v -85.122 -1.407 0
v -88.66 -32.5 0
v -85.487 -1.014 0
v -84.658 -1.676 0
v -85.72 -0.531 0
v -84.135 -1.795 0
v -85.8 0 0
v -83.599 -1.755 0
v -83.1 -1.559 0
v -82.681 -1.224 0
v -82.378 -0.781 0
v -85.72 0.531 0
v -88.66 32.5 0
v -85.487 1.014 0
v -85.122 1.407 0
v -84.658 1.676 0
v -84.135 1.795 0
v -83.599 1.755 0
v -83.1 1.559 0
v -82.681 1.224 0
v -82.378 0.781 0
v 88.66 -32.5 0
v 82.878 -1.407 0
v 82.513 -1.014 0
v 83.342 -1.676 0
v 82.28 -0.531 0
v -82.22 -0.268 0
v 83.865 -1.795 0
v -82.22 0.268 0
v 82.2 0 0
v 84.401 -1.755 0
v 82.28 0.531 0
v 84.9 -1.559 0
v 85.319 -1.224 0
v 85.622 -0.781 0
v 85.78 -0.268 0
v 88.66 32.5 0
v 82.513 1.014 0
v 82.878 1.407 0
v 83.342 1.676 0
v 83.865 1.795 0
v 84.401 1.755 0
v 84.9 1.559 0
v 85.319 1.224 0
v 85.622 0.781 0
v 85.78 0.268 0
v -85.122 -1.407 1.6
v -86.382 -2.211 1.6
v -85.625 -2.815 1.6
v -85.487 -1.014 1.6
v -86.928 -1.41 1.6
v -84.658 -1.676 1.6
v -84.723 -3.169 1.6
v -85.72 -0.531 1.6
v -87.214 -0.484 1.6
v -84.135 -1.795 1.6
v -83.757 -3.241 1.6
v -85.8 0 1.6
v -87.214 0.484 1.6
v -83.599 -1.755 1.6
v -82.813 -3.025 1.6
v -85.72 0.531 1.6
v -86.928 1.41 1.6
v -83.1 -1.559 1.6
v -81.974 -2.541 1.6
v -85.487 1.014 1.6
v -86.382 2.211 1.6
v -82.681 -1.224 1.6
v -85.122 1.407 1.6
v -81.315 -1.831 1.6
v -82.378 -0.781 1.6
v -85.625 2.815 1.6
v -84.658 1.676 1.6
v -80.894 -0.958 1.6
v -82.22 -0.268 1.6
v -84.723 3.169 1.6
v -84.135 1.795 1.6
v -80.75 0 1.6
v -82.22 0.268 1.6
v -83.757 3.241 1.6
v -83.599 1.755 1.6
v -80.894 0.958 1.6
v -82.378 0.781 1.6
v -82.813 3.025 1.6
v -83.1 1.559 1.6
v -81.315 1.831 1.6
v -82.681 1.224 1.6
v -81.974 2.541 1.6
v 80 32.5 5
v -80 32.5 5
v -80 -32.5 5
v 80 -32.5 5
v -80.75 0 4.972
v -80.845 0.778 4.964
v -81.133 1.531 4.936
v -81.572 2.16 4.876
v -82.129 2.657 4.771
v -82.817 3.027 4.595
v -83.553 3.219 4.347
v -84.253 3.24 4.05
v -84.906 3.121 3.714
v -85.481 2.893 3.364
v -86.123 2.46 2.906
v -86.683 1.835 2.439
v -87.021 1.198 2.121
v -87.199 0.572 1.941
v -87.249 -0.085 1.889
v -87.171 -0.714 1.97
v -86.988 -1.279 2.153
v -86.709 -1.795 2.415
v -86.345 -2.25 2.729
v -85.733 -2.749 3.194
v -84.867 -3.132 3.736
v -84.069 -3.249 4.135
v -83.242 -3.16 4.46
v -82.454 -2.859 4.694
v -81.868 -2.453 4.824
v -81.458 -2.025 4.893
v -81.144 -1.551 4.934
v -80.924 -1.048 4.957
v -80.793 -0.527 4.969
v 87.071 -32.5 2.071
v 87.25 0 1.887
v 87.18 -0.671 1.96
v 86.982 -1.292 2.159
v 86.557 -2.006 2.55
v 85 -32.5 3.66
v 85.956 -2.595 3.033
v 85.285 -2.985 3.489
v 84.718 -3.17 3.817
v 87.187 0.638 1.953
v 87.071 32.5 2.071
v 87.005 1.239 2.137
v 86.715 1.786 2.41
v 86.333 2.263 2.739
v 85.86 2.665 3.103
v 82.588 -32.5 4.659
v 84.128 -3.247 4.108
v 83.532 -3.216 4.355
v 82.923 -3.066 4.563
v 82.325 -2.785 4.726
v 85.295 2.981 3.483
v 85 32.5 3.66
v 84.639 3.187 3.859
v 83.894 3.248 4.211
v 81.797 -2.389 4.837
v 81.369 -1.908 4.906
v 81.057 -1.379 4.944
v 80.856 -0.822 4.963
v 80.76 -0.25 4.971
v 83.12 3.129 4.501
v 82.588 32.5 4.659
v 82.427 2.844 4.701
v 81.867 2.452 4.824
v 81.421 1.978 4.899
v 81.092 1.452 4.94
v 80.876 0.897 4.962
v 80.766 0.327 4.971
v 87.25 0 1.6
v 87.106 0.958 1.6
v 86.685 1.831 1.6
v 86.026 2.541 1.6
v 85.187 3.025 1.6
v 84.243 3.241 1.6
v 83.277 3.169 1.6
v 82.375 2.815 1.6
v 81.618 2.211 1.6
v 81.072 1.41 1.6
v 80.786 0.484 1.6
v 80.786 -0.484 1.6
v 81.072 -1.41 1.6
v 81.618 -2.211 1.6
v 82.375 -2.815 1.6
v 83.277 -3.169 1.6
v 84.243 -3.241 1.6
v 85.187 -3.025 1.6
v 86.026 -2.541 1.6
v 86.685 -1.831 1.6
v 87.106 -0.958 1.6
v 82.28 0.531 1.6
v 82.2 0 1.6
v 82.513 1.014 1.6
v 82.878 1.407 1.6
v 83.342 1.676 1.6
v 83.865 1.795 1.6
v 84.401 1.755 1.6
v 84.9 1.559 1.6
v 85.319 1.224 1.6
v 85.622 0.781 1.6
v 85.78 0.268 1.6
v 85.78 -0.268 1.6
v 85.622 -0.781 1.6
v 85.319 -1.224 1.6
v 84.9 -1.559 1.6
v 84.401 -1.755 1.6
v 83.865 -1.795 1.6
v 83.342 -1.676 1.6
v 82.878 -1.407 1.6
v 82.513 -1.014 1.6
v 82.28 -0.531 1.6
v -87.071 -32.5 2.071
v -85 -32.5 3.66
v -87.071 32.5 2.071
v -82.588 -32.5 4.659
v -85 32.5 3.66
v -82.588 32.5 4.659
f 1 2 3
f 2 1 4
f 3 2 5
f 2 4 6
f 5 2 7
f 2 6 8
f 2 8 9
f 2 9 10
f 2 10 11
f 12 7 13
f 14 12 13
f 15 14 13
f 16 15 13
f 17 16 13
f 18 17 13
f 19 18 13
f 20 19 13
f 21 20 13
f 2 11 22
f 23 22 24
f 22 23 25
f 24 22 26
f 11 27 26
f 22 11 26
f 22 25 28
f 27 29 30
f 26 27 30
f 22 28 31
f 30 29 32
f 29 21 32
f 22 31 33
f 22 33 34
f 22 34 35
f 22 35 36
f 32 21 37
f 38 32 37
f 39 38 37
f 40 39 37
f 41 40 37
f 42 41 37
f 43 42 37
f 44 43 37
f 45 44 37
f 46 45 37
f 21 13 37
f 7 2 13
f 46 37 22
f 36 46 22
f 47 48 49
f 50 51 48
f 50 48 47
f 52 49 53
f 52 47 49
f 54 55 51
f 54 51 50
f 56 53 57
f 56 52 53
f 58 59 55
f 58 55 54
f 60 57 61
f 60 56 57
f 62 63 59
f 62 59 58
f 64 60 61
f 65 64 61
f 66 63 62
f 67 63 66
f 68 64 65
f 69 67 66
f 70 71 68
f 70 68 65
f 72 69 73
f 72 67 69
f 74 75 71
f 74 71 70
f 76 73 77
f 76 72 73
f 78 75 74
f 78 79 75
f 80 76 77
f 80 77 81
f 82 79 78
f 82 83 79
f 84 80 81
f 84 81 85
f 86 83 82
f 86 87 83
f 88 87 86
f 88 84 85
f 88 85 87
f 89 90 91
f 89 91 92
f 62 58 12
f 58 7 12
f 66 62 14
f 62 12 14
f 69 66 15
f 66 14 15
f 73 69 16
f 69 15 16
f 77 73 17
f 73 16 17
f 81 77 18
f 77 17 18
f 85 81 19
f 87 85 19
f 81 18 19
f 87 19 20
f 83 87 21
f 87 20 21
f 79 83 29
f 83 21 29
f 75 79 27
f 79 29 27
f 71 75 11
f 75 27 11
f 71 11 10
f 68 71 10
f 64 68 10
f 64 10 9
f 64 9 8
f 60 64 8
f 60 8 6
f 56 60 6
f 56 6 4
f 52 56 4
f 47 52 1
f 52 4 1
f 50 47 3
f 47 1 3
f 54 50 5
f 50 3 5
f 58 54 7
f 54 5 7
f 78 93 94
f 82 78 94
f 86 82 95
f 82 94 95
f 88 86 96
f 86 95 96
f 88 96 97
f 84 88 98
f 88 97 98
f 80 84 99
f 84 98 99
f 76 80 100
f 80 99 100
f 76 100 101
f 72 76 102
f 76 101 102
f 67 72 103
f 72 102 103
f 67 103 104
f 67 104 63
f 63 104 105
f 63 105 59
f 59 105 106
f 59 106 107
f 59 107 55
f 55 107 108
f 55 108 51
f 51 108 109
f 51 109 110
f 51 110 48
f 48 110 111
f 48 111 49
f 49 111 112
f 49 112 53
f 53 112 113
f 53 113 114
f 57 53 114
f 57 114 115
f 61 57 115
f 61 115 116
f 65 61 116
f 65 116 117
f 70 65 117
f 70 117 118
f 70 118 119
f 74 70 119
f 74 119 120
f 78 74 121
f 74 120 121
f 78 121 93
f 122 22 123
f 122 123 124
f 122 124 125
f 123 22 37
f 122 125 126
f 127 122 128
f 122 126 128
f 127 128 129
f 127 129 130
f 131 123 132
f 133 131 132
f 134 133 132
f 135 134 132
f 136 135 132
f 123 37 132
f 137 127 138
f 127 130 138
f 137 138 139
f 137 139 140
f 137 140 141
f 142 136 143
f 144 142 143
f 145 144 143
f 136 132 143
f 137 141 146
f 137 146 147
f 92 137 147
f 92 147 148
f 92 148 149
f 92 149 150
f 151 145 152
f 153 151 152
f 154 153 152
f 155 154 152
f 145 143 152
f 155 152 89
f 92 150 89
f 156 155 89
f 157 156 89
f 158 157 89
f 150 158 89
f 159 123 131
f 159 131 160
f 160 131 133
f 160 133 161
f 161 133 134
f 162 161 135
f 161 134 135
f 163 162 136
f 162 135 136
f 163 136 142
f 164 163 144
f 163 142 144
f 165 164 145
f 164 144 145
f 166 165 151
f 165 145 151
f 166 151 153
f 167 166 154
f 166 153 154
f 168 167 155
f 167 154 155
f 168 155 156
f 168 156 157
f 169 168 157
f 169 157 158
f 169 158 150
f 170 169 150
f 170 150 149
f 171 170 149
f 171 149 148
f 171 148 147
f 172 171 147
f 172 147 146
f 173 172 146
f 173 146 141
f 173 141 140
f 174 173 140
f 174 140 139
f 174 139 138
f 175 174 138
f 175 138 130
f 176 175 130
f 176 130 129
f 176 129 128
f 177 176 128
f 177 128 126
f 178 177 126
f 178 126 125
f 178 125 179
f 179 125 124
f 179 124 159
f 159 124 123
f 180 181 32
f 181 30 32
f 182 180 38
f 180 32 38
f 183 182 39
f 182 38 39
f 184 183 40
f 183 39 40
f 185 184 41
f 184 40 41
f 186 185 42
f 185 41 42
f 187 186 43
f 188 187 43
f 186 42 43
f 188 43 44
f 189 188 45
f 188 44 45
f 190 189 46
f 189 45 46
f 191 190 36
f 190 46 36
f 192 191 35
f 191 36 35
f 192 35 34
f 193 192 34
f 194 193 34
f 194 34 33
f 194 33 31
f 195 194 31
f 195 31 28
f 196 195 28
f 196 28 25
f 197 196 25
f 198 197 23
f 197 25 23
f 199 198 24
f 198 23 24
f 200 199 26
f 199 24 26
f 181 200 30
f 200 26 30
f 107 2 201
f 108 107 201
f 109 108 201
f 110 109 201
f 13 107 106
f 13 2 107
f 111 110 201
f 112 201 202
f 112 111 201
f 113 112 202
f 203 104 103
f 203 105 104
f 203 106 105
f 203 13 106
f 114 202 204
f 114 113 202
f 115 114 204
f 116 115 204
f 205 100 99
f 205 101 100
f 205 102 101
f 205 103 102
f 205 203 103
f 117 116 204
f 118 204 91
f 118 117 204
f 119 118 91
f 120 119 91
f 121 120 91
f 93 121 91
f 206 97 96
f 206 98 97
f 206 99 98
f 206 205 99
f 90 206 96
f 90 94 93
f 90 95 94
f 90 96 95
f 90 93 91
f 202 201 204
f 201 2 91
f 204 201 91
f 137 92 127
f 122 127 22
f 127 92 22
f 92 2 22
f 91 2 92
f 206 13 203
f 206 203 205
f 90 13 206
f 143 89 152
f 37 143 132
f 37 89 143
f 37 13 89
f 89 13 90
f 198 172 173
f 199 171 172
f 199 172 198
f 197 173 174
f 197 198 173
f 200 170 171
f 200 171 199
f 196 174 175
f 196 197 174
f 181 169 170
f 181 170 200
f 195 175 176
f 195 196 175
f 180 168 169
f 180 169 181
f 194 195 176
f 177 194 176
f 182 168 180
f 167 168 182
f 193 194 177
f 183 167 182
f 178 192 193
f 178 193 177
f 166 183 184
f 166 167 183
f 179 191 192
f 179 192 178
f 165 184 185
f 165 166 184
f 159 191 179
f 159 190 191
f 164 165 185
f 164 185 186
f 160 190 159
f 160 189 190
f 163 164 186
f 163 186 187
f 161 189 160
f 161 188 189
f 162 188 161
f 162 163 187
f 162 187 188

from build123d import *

# Parameters (mm, degrees)
SKIZZE1_W                                            = 180
SKIZZE1_H                                            = 65
AUFSATZ_LINEAR_AUSTRAGEN1_DEPTH                      = 5
STIRNSENKUNG_F_R_M3_ZYLINDERSCHRAUBE_MIT_D           = 3.6
STIRNSENKUNG_F_R_M3_ZYLINDERSCHRAUBE_MIT_DEPTH       = 9.1
STIRNSENKUNG_F_R_M3_ZYLINDERSCHRAUBE_MIT_CBORE_D     = 6.5
STIRNSENKUNG_F_R_M3_ZYLINDERSCHRAUBE_MIT_CBORE_DEPTH = 3.4
STIRNSENKUNG_F_R_M3_ZYLINDERSCHRAUBE_MIT_TIP         = 1.081549114
SCHNITT_LINEAR_AUSTRAGEN1_DEPTH                      = 66


with BuildPart() as part:
    # Skizze1 → Aufsatz-Linear austragen1 (new body)
    with BuildSketch(Plane.XY):
        Rectangle(SKIZZE1_W, SKIZZE1_H)
    extrude(amount=AUFSATZ_LINEAR_AUSTRAGEN1_DEPTH)

    # Stirnsenkung für M3 Zylinderschraube mit Innensechskant1
    with Locations(Plane.XY.offset(5)):
        with Locations((-84, 0), (84, 0)):
            CounterBoreHole(STIRNSENKUNG_F_R_M3_ZYLINDERSCHRAUBE_MIT_D / 2, STIRNSENKUNG_F_R_M3_ZYLINDERSCHRAUBE_MIT_CBORE_D / 2, STIRNSENKUNG_F_R_M3_ZYLINDERSCHRAUBE_MIT_CBORE_DEPTH, depth=STIRNSENKUNG_F_R_M3_ZYLINDERSCHRAUBE_MIT_DEPTH)
            with Locations((0, 0, -(STIRNSENKUNG_F_R_M3_ZYLINDERSCHRAUBE_MIT_DEPTH + STIRNSENKUNG_F_R_M3_ZYLINDERSCHRAUBE_MIT_TIP / 2))):  # 118° drill point
                Cone(0, STIRNSENKUNG_F_R_M3_ZYLINDERSCHRAUBE_MIT_D / 2, STIRNSENKUNG_F_R_M3_ZYLINDERSCHRAUBE_MIT_TIP, mode=Mode.SUBTRACT)

    # Skizze6 → Schnitt-Linear austragen1 (cut, through all)
    with BuildSketch(Plane(origin=(0, 32.5, 0), x_dir=(1, 0, 0), z_dir=(0, 1, 0))):
        with BuildLine():
            Line((-90, -5), (-90, 5))
            ThreePointArc((-90, 5), (-87.071067812, -2.071067812), (-80, -5))
            Line((-80, -5), (-90, -5))
        make_face()
        with BuildLine():
            Line((80, -5), (90, -5))
            Line((90, -5), (90, 5))
            ThreePointArc((90, 5), (87.071067812, -2.071067812), (80, -5))
        make_face()
    extrude(amount=-SCHNITT_LINEAR_AUSTRAGEN1_DEPTH, mode=Mode.SUBTRACT)


solid = part.part
